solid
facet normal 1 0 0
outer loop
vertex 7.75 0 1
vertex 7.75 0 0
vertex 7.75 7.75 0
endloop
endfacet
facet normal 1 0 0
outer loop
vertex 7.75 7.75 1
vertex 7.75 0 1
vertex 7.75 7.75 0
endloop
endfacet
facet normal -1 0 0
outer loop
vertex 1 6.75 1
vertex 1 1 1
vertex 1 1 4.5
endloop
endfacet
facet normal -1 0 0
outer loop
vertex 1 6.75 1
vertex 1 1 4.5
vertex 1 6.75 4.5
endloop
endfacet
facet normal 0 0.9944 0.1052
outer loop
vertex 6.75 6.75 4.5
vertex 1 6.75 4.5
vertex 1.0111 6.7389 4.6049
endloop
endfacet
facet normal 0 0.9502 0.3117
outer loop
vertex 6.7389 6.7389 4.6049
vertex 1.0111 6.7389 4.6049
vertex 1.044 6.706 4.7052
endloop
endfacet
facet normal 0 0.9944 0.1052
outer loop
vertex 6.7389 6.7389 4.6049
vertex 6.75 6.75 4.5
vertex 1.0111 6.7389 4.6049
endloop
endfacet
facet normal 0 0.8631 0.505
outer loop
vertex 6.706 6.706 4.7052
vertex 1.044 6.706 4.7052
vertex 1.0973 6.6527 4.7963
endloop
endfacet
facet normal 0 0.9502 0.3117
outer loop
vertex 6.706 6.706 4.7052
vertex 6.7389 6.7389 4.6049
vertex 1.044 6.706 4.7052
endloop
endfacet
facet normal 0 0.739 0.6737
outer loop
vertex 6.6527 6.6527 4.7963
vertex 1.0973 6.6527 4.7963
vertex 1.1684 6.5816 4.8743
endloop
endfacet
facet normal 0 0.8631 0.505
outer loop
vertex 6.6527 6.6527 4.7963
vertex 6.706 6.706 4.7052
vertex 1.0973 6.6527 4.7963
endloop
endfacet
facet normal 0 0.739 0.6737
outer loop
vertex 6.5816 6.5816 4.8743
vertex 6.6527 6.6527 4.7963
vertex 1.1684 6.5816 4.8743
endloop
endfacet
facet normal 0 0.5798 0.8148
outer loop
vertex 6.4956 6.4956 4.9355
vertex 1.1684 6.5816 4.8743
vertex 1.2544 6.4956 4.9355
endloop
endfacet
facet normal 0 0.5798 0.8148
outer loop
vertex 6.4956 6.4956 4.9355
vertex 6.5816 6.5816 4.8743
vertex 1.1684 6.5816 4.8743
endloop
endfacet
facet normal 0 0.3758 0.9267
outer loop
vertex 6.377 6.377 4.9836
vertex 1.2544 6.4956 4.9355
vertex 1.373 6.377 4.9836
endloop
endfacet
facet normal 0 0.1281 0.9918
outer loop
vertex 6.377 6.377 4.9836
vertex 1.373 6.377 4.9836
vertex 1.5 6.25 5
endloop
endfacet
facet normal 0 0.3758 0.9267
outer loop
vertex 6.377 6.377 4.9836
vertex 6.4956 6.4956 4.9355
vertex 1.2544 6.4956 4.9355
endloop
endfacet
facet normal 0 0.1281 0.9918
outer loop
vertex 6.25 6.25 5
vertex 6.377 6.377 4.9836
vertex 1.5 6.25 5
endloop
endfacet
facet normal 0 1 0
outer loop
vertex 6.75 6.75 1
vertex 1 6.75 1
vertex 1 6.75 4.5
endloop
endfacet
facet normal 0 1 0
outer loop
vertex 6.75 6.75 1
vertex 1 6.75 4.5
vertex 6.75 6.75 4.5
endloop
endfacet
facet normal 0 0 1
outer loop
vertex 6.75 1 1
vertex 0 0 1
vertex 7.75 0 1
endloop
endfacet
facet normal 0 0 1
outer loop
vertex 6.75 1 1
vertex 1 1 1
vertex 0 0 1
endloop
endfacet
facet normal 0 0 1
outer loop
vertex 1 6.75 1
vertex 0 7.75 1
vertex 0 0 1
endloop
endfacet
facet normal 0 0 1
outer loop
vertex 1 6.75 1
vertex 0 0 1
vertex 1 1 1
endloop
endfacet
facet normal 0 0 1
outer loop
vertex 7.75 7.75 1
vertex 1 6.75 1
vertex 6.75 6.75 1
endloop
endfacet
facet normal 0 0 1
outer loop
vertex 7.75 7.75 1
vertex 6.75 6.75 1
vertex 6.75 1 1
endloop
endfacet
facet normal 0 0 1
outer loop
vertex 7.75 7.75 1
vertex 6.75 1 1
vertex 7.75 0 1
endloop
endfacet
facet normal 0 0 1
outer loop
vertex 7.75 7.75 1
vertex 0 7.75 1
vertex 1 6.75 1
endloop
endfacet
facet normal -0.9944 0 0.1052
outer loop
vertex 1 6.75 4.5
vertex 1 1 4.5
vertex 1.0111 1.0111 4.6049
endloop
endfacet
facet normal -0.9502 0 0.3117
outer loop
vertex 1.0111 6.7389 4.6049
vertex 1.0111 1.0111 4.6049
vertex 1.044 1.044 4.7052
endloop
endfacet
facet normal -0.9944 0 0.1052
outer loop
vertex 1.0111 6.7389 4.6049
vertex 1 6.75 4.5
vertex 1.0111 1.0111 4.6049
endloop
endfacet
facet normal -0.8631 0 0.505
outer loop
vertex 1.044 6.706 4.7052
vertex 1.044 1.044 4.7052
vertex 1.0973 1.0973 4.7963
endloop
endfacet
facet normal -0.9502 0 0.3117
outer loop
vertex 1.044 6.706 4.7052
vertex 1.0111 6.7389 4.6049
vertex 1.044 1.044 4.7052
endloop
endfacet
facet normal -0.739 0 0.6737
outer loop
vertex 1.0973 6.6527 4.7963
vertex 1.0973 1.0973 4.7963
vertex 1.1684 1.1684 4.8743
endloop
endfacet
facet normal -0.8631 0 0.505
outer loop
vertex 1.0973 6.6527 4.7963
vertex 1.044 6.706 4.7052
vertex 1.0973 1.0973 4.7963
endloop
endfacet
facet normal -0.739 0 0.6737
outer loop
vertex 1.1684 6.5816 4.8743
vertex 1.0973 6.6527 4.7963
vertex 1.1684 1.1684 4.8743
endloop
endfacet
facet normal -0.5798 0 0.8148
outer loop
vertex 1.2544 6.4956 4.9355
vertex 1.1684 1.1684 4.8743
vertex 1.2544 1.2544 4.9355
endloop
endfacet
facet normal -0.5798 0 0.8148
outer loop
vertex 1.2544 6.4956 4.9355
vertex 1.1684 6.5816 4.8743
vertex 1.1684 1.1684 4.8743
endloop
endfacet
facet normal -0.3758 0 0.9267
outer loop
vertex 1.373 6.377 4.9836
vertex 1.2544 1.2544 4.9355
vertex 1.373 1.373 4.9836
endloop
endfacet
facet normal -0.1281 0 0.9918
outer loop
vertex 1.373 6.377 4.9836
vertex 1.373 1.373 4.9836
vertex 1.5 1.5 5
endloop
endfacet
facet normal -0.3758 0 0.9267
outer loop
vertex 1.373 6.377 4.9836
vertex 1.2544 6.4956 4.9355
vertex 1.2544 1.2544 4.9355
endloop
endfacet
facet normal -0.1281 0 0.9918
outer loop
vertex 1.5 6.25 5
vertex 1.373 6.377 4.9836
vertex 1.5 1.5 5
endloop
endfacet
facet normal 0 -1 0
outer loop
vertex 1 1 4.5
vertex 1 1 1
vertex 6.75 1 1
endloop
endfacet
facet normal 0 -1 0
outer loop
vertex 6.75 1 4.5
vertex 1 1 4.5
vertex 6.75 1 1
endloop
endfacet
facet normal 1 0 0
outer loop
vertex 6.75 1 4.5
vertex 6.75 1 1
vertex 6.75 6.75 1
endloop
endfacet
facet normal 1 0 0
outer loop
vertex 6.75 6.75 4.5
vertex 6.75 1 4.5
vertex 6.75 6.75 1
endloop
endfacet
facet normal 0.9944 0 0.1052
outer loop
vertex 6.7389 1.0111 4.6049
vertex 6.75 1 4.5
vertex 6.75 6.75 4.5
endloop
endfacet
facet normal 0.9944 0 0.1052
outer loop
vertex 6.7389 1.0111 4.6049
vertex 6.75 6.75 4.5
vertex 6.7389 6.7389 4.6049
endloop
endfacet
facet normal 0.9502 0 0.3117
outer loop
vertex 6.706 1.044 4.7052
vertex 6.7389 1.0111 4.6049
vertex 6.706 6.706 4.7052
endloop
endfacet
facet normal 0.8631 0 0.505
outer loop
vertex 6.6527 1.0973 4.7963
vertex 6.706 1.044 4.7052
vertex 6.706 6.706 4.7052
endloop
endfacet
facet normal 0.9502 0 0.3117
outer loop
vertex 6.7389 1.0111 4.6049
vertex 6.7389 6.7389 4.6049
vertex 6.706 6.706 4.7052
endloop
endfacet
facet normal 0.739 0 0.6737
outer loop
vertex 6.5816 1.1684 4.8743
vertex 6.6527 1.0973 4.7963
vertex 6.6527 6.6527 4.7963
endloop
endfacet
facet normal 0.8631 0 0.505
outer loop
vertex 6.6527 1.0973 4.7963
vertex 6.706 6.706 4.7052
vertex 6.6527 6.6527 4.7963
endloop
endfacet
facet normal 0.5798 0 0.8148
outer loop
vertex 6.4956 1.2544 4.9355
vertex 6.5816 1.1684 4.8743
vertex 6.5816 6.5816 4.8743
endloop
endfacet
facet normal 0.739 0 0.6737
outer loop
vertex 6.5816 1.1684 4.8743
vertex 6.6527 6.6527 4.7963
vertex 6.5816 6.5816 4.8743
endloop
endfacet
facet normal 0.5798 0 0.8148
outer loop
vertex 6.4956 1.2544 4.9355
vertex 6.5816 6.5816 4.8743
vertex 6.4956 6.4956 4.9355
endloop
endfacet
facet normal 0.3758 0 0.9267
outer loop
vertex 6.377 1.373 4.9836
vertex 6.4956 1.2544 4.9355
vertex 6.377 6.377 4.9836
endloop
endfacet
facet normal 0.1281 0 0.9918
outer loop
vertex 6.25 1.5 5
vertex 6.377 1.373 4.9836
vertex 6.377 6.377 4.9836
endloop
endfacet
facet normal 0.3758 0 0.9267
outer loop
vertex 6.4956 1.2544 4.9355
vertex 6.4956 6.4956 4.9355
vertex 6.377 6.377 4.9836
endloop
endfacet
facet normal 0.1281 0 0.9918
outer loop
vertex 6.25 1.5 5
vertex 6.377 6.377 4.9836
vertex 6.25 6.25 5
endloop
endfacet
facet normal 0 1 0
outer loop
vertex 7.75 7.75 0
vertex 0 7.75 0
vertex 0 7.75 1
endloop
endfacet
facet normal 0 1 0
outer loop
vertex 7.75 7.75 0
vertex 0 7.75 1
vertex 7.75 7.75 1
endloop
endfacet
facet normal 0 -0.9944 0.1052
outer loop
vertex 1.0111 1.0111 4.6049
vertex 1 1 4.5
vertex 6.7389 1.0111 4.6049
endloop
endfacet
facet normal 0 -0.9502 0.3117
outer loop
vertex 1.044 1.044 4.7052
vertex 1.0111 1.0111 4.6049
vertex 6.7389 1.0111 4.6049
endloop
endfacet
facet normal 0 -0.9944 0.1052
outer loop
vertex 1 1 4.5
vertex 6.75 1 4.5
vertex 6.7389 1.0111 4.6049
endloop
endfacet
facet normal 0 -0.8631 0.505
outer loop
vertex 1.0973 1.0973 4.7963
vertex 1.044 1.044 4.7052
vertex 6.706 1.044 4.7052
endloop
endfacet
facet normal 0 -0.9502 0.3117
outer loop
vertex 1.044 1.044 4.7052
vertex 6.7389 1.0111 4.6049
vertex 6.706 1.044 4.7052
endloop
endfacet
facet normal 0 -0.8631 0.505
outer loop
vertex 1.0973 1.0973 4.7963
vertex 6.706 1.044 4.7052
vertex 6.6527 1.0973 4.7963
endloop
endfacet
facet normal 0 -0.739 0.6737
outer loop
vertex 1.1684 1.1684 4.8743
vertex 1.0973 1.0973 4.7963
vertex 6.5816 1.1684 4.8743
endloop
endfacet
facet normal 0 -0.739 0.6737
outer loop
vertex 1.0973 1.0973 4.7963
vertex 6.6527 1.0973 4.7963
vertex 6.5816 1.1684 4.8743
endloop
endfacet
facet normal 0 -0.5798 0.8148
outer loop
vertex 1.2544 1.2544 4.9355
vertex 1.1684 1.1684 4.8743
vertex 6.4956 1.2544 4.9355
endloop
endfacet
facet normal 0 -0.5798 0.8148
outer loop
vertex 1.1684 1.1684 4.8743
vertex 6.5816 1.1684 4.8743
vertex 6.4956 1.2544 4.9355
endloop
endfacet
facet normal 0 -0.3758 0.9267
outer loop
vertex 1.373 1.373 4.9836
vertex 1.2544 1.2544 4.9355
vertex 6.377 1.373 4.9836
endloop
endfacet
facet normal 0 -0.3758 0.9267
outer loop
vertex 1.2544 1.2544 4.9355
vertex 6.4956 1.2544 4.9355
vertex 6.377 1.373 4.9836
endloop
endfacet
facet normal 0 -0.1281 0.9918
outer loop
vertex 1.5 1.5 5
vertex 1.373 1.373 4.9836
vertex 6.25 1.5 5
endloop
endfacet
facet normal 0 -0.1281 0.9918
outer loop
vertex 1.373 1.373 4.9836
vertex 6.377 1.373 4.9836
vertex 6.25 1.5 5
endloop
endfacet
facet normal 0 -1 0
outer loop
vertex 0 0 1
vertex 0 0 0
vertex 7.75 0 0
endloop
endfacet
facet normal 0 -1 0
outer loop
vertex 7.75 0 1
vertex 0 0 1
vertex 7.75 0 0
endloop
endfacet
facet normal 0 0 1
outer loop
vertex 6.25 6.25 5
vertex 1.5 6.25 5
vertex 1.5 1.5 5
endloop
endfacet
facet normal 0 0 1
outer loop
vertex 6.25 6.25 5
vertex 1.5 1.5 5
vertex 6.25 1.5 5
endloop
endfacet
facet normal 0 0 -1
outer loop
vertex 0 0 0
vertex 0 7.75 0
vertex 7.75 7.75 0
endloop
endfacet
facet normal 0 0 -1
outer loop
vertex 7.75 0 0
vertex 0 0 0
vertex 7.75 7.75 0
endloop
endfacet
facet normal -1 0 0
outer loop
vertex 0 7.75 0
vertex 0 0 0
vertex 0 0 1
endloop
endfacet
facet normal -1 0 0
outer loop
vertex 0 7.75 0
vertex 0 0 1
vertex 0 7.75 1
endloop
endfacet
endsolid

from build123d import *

# Parameters (mm, degrees)
SKETCH_W     = 7.75
SKETCH_H     = 7.75
PAD_DEPTH    = 1
SKETCH001_W  = 5.75
SKETCH001_H  = 5.75
PAD001_DEPTH = 4
FILLET_R     = 0.5


with BuildPart() as part:
    # Sketch → Pad (new body)
    with BuildSketch(Plane.XY):
        with Locations((3.875, 3.875)):
            Rectangle(SKETCH_W, SKETCH_H)
    extrude(amount=PAD_DEPTH)

    # Sketch001 (on Face6 of Pad) → Pad001 (join)
    with BuildSketch(Plane.XY.offset(1)):
        with Locations((3.875, 3.875)):
            Rectangle(SKETCH001_W, SKETCH001_H)
    extrude(amount=PAD001_DEPTH)

    # Fillet
    fillet_edges = [part.edges().sort_by_distance(p)[0] for p in [
        (3.875, 6.75, 5),
        (6.75, 3.875, 5),
        (1, 3.875, 5),
        (3.875, 1, 5),
    ]]
    fillet(fillet_edges, radius=FILLET_R)


solid = part.part
